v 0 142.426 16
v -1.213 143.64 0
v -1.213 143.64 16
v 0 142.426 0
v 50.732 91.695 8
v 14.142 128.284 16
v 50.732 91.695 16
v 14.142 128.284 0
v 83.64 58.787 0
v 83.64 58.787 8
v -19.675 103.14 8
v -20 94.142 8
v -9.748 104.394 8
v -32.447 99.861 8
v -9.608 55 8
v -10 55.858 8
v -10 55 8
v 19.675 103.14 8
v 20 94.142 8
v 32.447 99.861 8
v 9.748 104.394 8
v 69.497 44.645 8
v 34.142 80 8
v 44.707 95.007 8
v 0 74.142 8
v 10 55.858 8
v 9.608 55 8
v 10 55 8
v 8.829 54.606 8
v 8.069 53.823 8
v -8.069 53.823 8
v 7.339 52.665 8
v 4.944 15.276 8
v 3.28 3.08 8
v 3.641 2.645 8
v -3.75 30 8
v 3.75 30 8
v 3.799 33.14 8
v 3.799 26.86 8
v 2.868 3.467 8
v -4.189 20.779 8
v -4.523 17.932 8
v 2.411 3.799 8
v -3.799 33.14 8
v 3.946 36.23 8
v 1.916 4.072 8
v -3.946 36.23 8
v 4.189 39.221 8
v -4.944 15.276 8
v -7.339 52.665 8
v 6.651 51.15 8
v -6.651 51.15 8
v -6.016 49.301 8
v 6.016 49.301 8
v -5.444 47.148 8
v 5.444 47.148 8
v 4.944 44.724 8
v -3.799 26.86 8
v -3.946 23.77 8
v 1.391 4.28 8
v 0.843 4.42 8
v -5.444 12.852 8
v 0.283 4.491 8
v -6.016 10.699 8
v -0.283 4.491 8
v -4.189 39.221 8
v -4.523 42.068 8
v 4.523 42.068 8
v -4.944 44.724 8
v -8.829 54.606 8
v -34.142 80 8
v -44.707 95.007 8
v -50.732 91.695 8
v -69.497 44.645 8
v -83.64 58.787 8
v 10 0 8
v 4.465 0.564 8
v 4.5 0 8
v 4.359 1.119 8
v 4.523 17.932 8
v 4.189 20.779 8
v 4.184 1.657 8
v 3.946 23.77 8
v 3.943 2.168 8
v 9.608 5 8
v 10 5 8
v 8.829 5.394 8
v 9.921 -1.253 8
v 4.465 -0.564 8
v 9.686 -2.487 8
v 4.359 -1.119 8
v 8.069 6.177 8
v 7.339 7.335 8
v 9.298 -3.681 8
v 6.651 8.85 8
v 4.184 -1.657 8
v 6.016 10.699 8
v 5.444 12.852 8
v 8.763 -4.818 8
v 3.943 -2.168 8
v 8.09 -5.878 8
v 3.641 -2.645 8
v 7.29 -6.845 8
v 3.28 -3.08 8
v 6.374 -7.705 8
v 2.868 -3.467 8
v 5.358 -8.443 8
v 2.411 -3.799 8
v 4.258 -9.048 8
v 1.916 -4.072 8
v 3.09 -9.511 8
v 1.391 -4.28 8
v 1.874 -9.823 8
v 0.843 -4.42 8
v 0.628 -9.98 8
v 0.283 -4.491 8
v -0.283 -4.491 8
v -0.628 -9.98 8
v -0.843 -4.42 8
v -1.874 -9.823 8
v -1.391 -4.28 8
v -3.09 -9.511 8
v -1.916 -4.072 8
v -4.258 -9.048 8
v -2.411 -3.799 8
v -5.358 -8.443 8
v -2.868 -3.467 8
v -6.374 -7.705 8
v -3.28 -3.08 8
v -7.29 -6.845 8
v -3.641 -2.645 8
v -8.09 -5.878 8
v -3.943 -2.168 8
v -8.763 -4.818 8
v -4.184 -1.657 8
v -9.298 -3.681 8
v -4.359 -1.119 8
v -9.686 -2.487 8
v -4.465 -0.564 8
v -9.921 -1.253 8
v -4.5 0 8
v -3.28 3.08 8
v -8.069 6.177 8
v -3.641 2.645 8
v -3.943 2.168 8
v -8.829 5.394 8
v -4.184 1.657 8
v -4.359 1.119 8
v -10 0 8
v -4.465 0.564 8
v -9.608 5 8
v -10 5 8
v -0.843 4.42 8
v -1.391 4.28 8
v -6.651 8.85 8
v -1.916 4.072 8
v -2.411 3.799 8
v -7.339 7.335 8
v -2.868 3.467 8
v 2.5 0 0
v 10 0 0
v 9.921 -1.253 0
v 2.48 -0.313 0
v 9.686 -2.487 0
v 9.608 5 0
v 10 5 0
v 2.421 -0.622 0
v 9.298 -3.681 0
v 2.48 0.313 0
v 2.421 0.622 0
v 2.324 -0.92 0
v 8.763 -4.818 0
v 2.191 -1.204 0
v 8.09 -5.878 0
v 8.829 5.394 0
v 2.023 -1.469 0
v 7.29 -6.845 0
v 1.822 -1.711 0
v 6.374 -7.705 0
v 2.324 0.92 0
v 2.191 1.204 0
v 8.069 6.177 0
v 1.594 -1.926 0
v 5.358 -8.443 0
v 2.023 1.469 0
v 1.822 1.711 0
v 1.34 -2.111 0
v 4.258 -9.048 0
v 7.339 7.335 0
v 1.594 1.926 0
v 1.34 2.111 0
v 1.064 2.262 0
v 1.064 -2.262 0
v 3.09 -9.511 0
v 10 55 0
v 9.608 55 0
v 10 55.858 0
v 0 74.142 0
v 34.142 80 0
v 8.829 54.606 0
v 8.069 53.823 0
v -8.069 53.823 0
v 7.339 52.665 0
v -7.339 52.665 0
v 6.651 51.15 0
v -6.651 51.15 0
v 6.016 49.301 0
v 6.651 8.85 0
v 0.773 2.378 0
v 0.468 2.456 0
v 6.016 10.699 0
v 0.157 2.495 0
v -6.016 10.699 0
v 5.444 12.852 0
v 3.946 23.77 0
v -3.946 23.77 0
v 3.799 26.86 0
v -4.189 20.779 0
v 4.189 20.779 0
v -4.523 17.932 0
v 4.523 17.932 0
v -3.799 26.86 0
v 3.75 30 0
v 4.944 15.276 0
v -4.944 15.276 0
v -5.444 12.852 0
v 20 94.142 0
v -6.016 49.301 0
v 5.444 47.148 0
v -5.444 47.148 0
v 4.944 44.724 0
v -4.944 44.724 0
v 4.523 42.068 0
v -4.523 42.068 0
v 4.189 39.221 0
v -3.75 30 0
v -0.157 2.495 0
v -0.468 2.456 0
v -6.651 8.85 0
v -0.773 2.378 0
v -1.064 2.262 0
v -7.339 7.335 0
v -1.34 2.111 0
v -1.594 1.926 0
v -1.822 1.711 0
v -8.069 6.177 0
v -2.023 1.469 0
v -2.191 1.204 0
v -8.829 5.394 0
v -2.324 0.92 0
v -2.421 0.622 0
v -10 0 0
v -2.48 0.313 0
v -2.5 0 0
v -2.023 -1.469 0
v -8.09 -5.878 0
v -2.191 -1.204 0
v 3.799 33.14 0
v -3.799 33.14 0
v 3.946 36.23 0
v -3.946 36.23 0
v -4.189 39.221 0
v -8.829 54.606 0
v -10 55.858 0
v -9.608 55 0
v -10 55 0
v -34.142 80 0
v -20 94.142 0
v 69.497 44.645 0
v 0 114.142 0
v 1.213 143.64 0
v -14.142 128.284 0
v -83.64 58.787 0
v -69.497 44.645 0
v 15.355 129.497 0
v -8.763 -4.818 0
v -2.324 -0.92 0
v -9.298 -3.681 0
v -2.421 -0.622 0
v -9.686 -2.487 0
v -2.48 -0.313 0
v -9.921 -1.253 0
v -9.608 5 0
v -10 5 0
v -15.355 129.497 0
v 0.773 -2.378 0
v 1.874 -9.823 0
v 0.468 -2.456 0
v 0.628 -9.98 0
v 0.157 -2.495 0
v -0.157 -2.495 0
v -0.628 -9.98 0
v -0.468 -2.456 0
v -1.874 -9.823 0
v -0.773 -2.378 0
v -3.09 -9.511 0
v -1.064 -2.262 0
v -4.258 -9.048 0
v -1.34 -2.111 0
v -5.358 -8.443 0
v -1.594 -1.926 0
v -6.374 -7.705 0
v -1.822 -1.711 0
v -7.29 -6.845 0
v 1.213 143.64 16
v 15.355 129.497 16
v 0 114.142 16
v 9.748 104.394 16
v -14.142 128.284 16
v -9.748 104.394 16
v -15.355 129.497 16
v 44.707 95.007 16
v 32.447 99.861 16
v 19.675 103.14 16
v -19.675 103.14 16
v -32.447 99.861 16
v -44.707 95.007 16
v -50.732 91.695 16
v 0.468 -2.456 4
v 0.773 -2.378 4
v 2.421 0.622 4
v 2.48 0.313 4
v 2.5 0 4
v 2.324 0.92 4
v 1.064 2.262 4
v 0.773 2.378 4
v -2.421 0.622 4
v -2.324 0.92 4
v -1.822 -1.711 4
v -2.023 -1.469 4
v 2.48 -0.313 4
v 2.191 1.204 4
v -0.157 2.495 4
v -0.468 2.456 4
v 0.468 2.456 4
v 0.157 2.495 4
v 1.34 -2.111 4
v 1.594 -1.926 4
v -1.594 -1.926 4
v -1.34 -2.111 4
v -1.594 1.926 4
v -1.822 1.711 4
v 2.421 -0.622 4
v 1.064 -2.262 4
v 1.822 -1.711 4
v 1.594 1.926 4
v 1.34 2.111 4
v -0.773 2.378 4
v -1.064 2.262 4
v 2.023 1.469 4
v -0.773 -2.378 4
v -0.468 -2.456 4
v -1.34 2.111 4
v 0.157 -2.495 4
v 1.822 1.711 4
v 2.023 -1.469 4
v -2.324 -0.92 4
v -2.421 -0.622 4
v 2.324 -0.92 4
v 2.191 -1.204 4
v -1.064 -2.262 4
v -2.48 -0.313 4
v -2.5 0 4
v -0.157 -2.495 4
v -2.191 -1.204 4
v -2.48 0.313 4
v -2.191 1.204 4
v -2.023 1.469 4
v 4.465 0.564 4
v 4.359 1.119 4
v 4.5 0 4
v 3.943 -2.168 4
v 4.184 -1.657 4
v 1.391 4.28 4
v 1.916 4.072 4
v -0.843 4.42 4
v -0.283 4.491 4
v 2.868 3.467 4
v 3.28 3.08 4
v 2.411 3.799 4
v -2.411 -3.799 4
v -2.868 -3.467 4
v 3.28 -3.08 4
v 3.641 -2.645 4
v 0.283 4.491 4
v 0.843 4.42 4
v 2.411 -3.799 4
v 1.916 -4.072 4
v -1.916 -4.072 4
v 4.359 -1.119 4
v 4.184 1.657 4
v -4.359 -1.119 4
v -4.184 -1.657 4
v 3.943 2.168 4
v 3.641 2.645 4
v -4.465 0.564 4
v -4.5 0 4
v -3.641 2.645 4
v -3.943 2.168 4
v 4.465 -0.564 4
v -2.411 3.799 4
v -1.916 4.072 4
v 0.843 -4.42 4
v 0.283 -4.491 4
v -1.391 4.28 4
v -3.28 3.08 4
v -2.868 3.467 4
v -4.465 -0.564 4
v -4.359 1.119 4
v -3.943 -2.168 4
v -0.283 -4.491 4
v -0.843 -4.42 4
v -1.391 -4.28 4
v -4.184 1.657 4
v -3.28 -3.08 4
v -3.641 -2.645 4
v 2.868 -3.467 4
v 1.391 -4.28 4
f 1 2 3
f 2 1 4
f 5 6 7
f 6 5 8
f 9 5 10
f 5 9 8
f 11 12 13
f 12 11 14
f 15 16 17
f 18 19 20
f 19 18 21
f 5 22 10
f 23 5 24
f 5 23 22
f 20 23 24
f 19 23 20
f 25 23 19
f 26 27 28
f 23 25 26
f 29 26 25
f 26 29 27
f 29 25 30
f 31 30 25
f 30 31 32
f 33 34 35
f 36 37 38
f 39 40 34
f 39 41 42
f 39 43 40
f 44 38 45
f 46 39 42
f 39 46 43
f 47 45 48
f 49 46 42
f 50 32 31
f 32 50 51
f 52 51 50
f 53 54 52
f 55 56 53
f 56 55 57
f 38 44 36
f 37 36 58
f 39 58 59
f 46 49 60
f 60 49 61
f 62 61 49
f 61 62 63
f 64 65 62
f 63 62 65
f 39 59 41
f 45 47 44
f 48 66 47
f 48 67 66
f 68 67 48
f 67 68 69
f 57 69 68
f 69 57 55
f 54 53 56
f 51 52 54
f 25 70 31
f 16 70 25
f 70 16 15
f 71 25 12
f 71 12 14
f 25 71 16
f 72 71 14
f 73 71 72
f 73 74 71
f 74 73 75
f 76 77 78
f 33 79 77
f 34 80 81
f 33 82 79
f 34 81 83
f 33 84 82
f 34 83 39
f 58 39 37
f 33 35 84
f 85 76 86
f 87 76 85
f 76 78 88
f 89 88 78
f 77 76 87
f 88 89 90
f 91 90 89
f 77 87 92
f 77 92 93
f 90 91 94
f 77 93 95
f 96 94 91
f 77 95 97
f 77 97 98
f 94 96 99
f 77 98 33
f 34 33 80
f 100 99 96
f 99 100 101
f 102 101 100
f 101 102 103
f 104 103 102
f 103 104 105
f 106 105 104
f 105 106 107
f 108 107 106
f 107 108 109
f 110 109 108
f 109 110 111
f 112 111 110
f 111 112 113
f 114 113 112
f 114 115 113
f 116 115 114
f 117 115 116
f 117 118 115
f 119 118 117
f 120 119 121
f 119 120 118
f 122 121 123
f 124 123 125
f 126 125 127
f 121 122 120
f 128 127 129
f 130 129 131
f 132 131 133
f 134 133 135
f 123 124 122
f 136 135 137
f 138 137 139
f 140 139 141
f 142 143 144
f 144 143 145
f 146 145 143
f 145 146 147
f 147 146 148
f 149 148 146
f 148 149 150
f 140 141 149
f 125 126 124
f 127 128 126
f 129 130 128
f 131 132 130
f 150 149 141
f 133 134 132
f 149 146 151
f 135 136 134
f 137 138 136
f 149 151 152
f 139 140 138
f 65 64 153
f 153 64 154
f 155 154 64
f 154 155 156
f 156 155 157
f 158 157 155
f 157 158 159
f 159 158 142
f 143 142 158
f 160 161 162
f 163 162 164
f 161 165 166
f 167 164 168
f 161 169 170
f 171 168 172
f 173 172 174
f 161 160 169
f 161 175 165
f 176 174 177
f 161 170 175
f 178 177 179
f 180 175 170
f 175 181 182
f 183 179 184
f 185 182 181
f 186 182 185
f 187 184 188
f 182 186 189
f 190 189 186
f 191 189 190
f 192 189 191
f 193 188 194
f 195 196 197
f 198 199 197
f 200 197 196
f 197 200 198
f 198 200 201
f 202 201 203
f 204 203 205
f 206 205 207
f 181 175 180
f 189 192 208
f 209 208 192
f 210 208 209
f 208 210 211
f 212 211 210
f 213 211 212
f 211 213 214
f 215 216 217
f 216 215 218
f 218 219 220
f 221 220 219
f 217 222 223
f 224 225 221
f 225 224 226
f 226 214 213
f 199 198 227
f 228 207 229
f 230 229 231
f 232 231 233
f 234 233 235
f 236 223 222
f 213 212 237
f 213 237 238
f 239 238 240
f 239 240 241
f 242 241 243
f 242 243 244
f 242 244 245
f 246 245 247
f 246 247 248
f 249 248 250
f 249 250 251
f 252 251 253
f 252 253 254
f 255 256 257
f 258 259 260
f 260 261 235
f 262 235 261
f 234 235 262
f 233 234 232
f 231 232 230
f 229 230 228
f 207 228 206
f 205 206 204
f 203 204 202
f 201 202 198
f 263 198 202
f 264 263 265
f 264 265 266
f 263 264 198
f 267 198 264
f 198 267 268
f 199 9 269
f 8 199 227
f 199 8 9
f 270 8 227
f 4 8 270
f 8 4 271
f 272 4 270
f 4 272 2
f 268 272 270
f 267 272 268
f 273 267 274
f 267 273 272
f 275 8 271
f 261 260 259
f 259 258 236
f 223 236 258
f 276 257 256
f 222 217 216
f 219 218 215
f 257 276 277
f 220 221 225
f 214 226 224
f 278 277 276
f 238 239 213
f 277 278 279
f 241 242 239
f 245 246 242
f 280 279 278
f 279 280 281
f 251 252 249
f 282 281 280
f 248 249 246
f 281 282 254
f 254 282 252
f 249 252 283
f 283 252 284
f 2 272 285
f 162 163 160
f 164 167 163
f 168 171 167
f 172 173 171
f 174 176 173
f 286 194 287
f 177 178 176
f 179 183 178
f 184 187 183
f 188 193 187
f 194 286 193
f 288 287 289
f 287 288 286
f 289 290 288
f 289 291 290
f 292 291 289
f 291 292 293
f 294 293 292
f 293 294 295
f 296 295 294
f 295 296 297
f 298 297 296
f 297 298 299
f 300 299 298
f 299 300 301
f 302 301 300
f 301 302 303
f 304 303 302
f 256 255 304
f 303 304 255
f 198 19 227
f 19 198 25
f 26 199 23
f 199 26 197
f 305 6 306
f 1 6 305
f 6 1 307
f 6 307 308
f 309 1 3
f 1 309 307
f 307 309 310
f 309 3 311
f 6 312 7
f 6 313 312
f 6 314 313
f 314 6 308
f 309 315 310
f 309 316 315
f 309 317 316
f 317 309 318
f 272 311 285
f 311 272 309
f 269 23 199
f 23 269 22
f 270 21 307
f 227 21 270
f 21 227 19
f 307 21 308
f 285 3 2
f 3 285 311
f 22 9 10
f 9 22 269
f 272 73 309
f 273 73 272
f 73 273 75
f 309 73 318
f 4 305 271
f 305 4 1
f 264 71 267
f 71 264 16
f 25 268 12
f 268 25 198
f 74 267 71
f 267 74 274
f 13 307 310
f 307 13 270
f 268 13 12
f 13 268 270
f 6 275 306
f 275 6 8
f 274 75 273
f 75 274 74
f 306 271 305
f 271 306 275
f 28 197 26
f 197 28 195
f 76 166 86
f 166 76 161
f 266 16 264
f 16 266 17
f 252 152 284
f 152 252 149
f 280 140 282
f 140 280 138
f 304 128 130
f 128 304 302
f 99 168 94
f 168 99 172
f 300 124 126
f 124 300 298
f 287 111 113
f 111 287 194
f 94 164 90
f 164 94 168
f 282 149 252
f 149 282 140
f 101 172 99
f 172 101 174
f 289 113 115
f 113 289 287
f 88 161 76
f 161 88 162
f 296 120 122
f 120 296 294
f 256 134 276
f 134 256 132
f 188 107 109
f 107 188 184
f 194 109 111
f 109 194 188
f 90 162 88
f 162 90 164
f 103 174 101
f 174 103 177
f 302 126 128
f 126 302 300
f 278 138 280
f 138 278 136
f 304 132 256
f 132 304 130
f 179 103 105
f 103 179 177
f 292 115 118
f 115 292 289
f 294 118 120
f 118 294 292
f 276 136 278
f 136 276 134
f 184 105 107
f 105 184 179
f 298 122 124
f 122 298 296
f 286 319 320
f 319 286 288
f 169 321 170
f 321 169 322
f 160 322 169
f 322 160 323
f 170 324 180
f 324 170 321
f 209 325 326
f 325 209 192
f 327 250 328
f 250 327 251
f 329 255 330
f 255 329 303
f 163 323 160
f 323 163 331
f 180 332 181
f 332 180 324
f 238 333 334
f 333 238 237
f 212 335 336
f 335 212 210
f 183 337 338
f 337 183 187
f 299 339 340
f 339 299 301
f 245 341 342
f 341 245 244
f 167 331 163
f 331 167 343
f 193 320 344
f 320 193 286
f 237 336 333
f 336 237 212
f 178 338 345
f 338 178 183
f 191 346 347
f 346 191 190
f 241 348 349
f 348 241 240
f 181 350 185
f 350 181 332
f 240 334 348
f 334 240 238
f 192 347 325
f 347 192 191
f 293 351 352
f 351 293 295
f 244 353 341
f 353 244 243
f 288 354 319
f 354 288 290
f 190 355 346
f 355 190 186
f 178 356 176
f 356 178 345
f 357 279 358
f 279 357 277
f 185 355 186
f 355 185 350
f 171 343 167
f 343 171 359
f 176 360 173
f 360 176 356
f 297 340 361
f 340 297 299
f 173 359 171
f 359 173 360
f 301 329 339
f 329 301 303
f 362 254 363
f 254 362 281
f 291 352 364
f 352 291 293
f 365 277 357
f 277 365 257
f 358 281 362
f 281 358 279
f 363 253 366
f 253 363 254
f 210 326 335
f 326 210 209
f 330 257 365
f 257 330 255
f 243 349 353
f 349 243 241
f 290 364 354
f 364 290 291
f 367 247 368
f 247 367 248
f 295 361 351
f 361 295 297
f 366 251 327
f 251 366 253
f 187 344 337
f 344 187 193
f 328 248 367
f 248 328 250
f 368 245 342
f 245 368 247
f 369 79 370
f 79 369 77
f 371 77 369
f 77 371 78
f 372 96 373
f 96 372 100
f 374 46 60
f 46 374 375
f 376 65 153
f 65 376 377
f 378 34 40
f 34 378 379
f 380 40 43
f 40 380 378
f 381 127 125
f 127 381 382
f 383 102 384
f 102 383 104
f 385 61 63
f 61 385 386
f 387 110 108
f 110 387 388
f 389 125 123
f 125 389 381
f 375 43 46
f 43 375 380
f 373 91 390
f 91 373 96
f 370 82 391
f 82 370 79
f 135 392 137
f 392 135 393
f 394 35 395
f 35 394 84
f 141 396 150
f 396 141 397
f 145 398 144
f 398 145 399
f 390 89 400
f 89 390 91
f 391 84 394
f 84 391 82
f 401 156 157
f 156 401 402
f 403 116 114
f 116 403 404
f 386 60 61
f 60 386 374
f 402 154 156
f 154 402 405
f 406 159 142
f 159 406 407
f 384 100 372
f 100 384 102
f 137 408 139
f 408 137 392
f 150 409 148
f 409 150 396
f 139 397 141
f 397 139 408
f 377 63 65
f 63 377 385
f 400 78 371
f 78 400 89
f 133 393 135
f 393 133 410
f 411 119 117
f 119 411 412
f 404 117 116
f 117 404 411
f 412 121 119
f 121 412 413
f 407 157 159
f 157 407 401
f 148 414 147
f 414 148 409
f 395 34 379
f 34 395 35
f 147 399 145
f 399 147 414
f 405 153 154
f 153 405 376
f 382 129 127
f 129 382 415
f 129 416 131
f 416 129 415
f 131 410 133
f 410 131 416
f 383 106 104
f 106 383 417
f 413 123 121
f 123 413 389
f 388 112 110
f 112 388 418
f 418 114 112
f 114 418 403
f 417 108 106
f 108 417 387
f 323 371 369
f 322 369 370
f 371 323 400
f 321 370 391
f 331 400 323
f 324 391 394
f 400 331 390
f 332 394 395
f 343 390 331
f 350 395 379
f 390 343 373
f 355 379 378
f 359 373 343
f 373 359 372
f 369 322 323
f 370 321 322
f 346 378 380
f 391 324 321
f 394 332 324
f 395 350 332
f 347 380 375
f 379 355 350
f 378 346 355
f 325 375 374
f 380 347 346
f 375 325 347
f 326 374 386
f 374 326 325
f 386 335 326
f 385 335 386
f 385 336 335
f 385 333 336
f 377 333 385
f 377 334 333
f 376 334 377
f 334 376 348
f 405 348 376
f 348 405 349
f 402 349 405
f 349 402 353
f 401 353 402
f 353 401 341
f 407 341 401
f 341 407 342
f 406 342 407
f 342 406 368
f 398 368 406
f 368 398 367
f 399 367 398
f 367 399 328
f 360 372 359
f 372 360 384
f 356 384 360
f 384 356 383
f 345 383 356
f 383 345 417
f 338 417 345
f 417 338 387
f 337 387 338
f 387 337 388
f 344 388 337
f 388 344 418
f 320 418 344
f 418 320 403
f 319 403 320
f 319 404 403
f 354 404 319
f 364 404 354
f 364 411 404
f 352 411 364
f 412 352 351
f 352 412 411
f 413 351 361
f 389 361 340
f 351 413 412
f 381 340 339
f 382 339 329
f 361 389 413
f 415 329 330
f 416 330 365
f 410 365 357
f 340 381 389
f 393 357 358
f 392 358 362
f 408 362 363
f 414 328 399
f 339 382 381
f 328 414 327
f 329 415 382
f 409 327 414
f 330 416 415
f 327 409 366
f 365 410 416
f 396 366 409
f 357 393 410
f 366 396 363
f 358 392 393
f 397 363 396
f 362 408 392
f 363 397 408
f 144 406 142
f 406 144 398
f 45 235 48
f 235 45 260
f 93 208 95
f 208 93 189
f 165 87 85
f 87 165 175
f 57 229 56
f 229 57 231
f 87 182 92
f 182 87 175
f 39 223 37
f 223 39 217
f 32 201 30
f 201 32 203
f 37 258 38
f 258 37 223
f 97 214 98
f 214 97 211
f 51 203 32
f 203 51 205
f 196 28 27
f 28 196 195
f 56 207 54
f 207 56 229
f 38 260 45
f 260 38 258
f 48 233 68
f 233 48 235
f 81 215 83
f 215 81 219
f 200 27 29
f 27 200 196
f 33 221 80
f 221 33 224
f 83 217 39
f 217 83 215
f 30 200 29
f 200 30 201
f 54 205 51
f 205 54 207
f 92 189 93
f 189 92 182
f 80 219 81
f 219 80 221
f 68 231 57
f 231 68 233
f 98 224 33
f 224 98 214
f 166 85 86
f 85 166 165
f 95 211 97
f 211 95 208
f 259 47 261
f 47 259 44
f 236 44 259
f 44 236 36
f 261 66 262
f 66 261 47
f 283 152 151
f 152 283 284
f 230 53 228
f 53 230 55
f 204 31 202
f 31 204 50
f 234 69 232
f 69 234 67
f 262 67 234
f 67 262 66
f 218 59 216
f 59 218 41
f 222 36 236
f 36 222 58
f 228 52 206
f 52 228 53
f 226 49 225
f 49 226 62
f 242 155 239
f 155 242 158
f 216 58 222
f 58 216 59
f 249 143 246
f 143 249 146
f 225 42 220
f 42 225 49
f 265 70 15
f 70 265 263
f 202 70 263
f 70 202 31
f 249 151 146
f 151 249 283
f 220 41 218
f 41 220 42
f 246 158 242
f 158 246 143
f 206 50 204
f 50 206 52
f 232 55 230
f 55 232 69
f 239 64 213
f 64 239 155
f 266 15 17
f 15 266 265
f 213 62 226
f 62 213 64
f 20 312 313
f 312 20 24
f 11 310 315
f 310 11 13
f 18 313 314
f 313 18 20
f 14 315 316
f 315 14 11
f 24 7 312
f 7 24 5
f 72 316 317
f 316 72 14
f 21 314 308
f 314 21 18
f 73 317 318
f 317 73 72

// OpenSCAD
screw = 5;
screwholderDiam = 20;
height = 8;
holderLength = 50;
leglength = 60;

$fn = 50;

module holder() {
    difference() {
        union() {
            cylinder(d=screwholderDiam, h= height);
            translate([-screwholderDiam / 2, 0, 0]) cube([screwholderDiam, holderLength, height]);
        }

        cylinder(d=screw, h= height);
        translate([0, 0, height / 2]) cylinder(d=screw+4, h= height / 2);                
    }
}

module removeParts() {
    translate([screwholderDiam / 2, holderLength / 2 + screwholderDiam / 4, 0]) 
        resize(newsize=[screwholderDiam / 8*5, holderLength, height])
            cylinder(d=screwholderDiam, h= height);

    translate([-screwholderDiam / 2, holderLength / 2 + screwholderDiam / 4, 0]) 
        resize(newsize=[screwholderDiam / 8*5, holderLength, height])
            cylinder(d=screwholderDiam, h= height);

    color("red") translate([0, 0, height + height / 2]) cylinder(r=holderLength + leglength - screwholderDiam / 4, h = height, center = true);
}

module lidcore() {
    color("green") cube([screwholderDiam, screwholderDiam, height], center = true);

    color("orange") translate([leglength / 2 - screwholderDiam / 2, screwholderDiam, 0]) rotate([0, 0, 45]) lidLeg();
    color("blue") translate([-leglength / 2+ screwholderDiam / 2, screwholderDiam, 0]) rotate([0, 0, 135]) lidLeg();
}

module lidLeg() {
    union() {
        cube([leglength, screwholderDiam, height], center = true);

        translate([leglength / 2- screwholderDiam / 2, 0, height / 2]) 
            cube([screwholderDiam, leglength * 2, height * 2], center = true);
    }
}

difference() {
    union() {
        translate([0, holderLength + screwholderDiam / 2, height / 2]) lidcore();
        holder();
    }

    removeParts();
}
